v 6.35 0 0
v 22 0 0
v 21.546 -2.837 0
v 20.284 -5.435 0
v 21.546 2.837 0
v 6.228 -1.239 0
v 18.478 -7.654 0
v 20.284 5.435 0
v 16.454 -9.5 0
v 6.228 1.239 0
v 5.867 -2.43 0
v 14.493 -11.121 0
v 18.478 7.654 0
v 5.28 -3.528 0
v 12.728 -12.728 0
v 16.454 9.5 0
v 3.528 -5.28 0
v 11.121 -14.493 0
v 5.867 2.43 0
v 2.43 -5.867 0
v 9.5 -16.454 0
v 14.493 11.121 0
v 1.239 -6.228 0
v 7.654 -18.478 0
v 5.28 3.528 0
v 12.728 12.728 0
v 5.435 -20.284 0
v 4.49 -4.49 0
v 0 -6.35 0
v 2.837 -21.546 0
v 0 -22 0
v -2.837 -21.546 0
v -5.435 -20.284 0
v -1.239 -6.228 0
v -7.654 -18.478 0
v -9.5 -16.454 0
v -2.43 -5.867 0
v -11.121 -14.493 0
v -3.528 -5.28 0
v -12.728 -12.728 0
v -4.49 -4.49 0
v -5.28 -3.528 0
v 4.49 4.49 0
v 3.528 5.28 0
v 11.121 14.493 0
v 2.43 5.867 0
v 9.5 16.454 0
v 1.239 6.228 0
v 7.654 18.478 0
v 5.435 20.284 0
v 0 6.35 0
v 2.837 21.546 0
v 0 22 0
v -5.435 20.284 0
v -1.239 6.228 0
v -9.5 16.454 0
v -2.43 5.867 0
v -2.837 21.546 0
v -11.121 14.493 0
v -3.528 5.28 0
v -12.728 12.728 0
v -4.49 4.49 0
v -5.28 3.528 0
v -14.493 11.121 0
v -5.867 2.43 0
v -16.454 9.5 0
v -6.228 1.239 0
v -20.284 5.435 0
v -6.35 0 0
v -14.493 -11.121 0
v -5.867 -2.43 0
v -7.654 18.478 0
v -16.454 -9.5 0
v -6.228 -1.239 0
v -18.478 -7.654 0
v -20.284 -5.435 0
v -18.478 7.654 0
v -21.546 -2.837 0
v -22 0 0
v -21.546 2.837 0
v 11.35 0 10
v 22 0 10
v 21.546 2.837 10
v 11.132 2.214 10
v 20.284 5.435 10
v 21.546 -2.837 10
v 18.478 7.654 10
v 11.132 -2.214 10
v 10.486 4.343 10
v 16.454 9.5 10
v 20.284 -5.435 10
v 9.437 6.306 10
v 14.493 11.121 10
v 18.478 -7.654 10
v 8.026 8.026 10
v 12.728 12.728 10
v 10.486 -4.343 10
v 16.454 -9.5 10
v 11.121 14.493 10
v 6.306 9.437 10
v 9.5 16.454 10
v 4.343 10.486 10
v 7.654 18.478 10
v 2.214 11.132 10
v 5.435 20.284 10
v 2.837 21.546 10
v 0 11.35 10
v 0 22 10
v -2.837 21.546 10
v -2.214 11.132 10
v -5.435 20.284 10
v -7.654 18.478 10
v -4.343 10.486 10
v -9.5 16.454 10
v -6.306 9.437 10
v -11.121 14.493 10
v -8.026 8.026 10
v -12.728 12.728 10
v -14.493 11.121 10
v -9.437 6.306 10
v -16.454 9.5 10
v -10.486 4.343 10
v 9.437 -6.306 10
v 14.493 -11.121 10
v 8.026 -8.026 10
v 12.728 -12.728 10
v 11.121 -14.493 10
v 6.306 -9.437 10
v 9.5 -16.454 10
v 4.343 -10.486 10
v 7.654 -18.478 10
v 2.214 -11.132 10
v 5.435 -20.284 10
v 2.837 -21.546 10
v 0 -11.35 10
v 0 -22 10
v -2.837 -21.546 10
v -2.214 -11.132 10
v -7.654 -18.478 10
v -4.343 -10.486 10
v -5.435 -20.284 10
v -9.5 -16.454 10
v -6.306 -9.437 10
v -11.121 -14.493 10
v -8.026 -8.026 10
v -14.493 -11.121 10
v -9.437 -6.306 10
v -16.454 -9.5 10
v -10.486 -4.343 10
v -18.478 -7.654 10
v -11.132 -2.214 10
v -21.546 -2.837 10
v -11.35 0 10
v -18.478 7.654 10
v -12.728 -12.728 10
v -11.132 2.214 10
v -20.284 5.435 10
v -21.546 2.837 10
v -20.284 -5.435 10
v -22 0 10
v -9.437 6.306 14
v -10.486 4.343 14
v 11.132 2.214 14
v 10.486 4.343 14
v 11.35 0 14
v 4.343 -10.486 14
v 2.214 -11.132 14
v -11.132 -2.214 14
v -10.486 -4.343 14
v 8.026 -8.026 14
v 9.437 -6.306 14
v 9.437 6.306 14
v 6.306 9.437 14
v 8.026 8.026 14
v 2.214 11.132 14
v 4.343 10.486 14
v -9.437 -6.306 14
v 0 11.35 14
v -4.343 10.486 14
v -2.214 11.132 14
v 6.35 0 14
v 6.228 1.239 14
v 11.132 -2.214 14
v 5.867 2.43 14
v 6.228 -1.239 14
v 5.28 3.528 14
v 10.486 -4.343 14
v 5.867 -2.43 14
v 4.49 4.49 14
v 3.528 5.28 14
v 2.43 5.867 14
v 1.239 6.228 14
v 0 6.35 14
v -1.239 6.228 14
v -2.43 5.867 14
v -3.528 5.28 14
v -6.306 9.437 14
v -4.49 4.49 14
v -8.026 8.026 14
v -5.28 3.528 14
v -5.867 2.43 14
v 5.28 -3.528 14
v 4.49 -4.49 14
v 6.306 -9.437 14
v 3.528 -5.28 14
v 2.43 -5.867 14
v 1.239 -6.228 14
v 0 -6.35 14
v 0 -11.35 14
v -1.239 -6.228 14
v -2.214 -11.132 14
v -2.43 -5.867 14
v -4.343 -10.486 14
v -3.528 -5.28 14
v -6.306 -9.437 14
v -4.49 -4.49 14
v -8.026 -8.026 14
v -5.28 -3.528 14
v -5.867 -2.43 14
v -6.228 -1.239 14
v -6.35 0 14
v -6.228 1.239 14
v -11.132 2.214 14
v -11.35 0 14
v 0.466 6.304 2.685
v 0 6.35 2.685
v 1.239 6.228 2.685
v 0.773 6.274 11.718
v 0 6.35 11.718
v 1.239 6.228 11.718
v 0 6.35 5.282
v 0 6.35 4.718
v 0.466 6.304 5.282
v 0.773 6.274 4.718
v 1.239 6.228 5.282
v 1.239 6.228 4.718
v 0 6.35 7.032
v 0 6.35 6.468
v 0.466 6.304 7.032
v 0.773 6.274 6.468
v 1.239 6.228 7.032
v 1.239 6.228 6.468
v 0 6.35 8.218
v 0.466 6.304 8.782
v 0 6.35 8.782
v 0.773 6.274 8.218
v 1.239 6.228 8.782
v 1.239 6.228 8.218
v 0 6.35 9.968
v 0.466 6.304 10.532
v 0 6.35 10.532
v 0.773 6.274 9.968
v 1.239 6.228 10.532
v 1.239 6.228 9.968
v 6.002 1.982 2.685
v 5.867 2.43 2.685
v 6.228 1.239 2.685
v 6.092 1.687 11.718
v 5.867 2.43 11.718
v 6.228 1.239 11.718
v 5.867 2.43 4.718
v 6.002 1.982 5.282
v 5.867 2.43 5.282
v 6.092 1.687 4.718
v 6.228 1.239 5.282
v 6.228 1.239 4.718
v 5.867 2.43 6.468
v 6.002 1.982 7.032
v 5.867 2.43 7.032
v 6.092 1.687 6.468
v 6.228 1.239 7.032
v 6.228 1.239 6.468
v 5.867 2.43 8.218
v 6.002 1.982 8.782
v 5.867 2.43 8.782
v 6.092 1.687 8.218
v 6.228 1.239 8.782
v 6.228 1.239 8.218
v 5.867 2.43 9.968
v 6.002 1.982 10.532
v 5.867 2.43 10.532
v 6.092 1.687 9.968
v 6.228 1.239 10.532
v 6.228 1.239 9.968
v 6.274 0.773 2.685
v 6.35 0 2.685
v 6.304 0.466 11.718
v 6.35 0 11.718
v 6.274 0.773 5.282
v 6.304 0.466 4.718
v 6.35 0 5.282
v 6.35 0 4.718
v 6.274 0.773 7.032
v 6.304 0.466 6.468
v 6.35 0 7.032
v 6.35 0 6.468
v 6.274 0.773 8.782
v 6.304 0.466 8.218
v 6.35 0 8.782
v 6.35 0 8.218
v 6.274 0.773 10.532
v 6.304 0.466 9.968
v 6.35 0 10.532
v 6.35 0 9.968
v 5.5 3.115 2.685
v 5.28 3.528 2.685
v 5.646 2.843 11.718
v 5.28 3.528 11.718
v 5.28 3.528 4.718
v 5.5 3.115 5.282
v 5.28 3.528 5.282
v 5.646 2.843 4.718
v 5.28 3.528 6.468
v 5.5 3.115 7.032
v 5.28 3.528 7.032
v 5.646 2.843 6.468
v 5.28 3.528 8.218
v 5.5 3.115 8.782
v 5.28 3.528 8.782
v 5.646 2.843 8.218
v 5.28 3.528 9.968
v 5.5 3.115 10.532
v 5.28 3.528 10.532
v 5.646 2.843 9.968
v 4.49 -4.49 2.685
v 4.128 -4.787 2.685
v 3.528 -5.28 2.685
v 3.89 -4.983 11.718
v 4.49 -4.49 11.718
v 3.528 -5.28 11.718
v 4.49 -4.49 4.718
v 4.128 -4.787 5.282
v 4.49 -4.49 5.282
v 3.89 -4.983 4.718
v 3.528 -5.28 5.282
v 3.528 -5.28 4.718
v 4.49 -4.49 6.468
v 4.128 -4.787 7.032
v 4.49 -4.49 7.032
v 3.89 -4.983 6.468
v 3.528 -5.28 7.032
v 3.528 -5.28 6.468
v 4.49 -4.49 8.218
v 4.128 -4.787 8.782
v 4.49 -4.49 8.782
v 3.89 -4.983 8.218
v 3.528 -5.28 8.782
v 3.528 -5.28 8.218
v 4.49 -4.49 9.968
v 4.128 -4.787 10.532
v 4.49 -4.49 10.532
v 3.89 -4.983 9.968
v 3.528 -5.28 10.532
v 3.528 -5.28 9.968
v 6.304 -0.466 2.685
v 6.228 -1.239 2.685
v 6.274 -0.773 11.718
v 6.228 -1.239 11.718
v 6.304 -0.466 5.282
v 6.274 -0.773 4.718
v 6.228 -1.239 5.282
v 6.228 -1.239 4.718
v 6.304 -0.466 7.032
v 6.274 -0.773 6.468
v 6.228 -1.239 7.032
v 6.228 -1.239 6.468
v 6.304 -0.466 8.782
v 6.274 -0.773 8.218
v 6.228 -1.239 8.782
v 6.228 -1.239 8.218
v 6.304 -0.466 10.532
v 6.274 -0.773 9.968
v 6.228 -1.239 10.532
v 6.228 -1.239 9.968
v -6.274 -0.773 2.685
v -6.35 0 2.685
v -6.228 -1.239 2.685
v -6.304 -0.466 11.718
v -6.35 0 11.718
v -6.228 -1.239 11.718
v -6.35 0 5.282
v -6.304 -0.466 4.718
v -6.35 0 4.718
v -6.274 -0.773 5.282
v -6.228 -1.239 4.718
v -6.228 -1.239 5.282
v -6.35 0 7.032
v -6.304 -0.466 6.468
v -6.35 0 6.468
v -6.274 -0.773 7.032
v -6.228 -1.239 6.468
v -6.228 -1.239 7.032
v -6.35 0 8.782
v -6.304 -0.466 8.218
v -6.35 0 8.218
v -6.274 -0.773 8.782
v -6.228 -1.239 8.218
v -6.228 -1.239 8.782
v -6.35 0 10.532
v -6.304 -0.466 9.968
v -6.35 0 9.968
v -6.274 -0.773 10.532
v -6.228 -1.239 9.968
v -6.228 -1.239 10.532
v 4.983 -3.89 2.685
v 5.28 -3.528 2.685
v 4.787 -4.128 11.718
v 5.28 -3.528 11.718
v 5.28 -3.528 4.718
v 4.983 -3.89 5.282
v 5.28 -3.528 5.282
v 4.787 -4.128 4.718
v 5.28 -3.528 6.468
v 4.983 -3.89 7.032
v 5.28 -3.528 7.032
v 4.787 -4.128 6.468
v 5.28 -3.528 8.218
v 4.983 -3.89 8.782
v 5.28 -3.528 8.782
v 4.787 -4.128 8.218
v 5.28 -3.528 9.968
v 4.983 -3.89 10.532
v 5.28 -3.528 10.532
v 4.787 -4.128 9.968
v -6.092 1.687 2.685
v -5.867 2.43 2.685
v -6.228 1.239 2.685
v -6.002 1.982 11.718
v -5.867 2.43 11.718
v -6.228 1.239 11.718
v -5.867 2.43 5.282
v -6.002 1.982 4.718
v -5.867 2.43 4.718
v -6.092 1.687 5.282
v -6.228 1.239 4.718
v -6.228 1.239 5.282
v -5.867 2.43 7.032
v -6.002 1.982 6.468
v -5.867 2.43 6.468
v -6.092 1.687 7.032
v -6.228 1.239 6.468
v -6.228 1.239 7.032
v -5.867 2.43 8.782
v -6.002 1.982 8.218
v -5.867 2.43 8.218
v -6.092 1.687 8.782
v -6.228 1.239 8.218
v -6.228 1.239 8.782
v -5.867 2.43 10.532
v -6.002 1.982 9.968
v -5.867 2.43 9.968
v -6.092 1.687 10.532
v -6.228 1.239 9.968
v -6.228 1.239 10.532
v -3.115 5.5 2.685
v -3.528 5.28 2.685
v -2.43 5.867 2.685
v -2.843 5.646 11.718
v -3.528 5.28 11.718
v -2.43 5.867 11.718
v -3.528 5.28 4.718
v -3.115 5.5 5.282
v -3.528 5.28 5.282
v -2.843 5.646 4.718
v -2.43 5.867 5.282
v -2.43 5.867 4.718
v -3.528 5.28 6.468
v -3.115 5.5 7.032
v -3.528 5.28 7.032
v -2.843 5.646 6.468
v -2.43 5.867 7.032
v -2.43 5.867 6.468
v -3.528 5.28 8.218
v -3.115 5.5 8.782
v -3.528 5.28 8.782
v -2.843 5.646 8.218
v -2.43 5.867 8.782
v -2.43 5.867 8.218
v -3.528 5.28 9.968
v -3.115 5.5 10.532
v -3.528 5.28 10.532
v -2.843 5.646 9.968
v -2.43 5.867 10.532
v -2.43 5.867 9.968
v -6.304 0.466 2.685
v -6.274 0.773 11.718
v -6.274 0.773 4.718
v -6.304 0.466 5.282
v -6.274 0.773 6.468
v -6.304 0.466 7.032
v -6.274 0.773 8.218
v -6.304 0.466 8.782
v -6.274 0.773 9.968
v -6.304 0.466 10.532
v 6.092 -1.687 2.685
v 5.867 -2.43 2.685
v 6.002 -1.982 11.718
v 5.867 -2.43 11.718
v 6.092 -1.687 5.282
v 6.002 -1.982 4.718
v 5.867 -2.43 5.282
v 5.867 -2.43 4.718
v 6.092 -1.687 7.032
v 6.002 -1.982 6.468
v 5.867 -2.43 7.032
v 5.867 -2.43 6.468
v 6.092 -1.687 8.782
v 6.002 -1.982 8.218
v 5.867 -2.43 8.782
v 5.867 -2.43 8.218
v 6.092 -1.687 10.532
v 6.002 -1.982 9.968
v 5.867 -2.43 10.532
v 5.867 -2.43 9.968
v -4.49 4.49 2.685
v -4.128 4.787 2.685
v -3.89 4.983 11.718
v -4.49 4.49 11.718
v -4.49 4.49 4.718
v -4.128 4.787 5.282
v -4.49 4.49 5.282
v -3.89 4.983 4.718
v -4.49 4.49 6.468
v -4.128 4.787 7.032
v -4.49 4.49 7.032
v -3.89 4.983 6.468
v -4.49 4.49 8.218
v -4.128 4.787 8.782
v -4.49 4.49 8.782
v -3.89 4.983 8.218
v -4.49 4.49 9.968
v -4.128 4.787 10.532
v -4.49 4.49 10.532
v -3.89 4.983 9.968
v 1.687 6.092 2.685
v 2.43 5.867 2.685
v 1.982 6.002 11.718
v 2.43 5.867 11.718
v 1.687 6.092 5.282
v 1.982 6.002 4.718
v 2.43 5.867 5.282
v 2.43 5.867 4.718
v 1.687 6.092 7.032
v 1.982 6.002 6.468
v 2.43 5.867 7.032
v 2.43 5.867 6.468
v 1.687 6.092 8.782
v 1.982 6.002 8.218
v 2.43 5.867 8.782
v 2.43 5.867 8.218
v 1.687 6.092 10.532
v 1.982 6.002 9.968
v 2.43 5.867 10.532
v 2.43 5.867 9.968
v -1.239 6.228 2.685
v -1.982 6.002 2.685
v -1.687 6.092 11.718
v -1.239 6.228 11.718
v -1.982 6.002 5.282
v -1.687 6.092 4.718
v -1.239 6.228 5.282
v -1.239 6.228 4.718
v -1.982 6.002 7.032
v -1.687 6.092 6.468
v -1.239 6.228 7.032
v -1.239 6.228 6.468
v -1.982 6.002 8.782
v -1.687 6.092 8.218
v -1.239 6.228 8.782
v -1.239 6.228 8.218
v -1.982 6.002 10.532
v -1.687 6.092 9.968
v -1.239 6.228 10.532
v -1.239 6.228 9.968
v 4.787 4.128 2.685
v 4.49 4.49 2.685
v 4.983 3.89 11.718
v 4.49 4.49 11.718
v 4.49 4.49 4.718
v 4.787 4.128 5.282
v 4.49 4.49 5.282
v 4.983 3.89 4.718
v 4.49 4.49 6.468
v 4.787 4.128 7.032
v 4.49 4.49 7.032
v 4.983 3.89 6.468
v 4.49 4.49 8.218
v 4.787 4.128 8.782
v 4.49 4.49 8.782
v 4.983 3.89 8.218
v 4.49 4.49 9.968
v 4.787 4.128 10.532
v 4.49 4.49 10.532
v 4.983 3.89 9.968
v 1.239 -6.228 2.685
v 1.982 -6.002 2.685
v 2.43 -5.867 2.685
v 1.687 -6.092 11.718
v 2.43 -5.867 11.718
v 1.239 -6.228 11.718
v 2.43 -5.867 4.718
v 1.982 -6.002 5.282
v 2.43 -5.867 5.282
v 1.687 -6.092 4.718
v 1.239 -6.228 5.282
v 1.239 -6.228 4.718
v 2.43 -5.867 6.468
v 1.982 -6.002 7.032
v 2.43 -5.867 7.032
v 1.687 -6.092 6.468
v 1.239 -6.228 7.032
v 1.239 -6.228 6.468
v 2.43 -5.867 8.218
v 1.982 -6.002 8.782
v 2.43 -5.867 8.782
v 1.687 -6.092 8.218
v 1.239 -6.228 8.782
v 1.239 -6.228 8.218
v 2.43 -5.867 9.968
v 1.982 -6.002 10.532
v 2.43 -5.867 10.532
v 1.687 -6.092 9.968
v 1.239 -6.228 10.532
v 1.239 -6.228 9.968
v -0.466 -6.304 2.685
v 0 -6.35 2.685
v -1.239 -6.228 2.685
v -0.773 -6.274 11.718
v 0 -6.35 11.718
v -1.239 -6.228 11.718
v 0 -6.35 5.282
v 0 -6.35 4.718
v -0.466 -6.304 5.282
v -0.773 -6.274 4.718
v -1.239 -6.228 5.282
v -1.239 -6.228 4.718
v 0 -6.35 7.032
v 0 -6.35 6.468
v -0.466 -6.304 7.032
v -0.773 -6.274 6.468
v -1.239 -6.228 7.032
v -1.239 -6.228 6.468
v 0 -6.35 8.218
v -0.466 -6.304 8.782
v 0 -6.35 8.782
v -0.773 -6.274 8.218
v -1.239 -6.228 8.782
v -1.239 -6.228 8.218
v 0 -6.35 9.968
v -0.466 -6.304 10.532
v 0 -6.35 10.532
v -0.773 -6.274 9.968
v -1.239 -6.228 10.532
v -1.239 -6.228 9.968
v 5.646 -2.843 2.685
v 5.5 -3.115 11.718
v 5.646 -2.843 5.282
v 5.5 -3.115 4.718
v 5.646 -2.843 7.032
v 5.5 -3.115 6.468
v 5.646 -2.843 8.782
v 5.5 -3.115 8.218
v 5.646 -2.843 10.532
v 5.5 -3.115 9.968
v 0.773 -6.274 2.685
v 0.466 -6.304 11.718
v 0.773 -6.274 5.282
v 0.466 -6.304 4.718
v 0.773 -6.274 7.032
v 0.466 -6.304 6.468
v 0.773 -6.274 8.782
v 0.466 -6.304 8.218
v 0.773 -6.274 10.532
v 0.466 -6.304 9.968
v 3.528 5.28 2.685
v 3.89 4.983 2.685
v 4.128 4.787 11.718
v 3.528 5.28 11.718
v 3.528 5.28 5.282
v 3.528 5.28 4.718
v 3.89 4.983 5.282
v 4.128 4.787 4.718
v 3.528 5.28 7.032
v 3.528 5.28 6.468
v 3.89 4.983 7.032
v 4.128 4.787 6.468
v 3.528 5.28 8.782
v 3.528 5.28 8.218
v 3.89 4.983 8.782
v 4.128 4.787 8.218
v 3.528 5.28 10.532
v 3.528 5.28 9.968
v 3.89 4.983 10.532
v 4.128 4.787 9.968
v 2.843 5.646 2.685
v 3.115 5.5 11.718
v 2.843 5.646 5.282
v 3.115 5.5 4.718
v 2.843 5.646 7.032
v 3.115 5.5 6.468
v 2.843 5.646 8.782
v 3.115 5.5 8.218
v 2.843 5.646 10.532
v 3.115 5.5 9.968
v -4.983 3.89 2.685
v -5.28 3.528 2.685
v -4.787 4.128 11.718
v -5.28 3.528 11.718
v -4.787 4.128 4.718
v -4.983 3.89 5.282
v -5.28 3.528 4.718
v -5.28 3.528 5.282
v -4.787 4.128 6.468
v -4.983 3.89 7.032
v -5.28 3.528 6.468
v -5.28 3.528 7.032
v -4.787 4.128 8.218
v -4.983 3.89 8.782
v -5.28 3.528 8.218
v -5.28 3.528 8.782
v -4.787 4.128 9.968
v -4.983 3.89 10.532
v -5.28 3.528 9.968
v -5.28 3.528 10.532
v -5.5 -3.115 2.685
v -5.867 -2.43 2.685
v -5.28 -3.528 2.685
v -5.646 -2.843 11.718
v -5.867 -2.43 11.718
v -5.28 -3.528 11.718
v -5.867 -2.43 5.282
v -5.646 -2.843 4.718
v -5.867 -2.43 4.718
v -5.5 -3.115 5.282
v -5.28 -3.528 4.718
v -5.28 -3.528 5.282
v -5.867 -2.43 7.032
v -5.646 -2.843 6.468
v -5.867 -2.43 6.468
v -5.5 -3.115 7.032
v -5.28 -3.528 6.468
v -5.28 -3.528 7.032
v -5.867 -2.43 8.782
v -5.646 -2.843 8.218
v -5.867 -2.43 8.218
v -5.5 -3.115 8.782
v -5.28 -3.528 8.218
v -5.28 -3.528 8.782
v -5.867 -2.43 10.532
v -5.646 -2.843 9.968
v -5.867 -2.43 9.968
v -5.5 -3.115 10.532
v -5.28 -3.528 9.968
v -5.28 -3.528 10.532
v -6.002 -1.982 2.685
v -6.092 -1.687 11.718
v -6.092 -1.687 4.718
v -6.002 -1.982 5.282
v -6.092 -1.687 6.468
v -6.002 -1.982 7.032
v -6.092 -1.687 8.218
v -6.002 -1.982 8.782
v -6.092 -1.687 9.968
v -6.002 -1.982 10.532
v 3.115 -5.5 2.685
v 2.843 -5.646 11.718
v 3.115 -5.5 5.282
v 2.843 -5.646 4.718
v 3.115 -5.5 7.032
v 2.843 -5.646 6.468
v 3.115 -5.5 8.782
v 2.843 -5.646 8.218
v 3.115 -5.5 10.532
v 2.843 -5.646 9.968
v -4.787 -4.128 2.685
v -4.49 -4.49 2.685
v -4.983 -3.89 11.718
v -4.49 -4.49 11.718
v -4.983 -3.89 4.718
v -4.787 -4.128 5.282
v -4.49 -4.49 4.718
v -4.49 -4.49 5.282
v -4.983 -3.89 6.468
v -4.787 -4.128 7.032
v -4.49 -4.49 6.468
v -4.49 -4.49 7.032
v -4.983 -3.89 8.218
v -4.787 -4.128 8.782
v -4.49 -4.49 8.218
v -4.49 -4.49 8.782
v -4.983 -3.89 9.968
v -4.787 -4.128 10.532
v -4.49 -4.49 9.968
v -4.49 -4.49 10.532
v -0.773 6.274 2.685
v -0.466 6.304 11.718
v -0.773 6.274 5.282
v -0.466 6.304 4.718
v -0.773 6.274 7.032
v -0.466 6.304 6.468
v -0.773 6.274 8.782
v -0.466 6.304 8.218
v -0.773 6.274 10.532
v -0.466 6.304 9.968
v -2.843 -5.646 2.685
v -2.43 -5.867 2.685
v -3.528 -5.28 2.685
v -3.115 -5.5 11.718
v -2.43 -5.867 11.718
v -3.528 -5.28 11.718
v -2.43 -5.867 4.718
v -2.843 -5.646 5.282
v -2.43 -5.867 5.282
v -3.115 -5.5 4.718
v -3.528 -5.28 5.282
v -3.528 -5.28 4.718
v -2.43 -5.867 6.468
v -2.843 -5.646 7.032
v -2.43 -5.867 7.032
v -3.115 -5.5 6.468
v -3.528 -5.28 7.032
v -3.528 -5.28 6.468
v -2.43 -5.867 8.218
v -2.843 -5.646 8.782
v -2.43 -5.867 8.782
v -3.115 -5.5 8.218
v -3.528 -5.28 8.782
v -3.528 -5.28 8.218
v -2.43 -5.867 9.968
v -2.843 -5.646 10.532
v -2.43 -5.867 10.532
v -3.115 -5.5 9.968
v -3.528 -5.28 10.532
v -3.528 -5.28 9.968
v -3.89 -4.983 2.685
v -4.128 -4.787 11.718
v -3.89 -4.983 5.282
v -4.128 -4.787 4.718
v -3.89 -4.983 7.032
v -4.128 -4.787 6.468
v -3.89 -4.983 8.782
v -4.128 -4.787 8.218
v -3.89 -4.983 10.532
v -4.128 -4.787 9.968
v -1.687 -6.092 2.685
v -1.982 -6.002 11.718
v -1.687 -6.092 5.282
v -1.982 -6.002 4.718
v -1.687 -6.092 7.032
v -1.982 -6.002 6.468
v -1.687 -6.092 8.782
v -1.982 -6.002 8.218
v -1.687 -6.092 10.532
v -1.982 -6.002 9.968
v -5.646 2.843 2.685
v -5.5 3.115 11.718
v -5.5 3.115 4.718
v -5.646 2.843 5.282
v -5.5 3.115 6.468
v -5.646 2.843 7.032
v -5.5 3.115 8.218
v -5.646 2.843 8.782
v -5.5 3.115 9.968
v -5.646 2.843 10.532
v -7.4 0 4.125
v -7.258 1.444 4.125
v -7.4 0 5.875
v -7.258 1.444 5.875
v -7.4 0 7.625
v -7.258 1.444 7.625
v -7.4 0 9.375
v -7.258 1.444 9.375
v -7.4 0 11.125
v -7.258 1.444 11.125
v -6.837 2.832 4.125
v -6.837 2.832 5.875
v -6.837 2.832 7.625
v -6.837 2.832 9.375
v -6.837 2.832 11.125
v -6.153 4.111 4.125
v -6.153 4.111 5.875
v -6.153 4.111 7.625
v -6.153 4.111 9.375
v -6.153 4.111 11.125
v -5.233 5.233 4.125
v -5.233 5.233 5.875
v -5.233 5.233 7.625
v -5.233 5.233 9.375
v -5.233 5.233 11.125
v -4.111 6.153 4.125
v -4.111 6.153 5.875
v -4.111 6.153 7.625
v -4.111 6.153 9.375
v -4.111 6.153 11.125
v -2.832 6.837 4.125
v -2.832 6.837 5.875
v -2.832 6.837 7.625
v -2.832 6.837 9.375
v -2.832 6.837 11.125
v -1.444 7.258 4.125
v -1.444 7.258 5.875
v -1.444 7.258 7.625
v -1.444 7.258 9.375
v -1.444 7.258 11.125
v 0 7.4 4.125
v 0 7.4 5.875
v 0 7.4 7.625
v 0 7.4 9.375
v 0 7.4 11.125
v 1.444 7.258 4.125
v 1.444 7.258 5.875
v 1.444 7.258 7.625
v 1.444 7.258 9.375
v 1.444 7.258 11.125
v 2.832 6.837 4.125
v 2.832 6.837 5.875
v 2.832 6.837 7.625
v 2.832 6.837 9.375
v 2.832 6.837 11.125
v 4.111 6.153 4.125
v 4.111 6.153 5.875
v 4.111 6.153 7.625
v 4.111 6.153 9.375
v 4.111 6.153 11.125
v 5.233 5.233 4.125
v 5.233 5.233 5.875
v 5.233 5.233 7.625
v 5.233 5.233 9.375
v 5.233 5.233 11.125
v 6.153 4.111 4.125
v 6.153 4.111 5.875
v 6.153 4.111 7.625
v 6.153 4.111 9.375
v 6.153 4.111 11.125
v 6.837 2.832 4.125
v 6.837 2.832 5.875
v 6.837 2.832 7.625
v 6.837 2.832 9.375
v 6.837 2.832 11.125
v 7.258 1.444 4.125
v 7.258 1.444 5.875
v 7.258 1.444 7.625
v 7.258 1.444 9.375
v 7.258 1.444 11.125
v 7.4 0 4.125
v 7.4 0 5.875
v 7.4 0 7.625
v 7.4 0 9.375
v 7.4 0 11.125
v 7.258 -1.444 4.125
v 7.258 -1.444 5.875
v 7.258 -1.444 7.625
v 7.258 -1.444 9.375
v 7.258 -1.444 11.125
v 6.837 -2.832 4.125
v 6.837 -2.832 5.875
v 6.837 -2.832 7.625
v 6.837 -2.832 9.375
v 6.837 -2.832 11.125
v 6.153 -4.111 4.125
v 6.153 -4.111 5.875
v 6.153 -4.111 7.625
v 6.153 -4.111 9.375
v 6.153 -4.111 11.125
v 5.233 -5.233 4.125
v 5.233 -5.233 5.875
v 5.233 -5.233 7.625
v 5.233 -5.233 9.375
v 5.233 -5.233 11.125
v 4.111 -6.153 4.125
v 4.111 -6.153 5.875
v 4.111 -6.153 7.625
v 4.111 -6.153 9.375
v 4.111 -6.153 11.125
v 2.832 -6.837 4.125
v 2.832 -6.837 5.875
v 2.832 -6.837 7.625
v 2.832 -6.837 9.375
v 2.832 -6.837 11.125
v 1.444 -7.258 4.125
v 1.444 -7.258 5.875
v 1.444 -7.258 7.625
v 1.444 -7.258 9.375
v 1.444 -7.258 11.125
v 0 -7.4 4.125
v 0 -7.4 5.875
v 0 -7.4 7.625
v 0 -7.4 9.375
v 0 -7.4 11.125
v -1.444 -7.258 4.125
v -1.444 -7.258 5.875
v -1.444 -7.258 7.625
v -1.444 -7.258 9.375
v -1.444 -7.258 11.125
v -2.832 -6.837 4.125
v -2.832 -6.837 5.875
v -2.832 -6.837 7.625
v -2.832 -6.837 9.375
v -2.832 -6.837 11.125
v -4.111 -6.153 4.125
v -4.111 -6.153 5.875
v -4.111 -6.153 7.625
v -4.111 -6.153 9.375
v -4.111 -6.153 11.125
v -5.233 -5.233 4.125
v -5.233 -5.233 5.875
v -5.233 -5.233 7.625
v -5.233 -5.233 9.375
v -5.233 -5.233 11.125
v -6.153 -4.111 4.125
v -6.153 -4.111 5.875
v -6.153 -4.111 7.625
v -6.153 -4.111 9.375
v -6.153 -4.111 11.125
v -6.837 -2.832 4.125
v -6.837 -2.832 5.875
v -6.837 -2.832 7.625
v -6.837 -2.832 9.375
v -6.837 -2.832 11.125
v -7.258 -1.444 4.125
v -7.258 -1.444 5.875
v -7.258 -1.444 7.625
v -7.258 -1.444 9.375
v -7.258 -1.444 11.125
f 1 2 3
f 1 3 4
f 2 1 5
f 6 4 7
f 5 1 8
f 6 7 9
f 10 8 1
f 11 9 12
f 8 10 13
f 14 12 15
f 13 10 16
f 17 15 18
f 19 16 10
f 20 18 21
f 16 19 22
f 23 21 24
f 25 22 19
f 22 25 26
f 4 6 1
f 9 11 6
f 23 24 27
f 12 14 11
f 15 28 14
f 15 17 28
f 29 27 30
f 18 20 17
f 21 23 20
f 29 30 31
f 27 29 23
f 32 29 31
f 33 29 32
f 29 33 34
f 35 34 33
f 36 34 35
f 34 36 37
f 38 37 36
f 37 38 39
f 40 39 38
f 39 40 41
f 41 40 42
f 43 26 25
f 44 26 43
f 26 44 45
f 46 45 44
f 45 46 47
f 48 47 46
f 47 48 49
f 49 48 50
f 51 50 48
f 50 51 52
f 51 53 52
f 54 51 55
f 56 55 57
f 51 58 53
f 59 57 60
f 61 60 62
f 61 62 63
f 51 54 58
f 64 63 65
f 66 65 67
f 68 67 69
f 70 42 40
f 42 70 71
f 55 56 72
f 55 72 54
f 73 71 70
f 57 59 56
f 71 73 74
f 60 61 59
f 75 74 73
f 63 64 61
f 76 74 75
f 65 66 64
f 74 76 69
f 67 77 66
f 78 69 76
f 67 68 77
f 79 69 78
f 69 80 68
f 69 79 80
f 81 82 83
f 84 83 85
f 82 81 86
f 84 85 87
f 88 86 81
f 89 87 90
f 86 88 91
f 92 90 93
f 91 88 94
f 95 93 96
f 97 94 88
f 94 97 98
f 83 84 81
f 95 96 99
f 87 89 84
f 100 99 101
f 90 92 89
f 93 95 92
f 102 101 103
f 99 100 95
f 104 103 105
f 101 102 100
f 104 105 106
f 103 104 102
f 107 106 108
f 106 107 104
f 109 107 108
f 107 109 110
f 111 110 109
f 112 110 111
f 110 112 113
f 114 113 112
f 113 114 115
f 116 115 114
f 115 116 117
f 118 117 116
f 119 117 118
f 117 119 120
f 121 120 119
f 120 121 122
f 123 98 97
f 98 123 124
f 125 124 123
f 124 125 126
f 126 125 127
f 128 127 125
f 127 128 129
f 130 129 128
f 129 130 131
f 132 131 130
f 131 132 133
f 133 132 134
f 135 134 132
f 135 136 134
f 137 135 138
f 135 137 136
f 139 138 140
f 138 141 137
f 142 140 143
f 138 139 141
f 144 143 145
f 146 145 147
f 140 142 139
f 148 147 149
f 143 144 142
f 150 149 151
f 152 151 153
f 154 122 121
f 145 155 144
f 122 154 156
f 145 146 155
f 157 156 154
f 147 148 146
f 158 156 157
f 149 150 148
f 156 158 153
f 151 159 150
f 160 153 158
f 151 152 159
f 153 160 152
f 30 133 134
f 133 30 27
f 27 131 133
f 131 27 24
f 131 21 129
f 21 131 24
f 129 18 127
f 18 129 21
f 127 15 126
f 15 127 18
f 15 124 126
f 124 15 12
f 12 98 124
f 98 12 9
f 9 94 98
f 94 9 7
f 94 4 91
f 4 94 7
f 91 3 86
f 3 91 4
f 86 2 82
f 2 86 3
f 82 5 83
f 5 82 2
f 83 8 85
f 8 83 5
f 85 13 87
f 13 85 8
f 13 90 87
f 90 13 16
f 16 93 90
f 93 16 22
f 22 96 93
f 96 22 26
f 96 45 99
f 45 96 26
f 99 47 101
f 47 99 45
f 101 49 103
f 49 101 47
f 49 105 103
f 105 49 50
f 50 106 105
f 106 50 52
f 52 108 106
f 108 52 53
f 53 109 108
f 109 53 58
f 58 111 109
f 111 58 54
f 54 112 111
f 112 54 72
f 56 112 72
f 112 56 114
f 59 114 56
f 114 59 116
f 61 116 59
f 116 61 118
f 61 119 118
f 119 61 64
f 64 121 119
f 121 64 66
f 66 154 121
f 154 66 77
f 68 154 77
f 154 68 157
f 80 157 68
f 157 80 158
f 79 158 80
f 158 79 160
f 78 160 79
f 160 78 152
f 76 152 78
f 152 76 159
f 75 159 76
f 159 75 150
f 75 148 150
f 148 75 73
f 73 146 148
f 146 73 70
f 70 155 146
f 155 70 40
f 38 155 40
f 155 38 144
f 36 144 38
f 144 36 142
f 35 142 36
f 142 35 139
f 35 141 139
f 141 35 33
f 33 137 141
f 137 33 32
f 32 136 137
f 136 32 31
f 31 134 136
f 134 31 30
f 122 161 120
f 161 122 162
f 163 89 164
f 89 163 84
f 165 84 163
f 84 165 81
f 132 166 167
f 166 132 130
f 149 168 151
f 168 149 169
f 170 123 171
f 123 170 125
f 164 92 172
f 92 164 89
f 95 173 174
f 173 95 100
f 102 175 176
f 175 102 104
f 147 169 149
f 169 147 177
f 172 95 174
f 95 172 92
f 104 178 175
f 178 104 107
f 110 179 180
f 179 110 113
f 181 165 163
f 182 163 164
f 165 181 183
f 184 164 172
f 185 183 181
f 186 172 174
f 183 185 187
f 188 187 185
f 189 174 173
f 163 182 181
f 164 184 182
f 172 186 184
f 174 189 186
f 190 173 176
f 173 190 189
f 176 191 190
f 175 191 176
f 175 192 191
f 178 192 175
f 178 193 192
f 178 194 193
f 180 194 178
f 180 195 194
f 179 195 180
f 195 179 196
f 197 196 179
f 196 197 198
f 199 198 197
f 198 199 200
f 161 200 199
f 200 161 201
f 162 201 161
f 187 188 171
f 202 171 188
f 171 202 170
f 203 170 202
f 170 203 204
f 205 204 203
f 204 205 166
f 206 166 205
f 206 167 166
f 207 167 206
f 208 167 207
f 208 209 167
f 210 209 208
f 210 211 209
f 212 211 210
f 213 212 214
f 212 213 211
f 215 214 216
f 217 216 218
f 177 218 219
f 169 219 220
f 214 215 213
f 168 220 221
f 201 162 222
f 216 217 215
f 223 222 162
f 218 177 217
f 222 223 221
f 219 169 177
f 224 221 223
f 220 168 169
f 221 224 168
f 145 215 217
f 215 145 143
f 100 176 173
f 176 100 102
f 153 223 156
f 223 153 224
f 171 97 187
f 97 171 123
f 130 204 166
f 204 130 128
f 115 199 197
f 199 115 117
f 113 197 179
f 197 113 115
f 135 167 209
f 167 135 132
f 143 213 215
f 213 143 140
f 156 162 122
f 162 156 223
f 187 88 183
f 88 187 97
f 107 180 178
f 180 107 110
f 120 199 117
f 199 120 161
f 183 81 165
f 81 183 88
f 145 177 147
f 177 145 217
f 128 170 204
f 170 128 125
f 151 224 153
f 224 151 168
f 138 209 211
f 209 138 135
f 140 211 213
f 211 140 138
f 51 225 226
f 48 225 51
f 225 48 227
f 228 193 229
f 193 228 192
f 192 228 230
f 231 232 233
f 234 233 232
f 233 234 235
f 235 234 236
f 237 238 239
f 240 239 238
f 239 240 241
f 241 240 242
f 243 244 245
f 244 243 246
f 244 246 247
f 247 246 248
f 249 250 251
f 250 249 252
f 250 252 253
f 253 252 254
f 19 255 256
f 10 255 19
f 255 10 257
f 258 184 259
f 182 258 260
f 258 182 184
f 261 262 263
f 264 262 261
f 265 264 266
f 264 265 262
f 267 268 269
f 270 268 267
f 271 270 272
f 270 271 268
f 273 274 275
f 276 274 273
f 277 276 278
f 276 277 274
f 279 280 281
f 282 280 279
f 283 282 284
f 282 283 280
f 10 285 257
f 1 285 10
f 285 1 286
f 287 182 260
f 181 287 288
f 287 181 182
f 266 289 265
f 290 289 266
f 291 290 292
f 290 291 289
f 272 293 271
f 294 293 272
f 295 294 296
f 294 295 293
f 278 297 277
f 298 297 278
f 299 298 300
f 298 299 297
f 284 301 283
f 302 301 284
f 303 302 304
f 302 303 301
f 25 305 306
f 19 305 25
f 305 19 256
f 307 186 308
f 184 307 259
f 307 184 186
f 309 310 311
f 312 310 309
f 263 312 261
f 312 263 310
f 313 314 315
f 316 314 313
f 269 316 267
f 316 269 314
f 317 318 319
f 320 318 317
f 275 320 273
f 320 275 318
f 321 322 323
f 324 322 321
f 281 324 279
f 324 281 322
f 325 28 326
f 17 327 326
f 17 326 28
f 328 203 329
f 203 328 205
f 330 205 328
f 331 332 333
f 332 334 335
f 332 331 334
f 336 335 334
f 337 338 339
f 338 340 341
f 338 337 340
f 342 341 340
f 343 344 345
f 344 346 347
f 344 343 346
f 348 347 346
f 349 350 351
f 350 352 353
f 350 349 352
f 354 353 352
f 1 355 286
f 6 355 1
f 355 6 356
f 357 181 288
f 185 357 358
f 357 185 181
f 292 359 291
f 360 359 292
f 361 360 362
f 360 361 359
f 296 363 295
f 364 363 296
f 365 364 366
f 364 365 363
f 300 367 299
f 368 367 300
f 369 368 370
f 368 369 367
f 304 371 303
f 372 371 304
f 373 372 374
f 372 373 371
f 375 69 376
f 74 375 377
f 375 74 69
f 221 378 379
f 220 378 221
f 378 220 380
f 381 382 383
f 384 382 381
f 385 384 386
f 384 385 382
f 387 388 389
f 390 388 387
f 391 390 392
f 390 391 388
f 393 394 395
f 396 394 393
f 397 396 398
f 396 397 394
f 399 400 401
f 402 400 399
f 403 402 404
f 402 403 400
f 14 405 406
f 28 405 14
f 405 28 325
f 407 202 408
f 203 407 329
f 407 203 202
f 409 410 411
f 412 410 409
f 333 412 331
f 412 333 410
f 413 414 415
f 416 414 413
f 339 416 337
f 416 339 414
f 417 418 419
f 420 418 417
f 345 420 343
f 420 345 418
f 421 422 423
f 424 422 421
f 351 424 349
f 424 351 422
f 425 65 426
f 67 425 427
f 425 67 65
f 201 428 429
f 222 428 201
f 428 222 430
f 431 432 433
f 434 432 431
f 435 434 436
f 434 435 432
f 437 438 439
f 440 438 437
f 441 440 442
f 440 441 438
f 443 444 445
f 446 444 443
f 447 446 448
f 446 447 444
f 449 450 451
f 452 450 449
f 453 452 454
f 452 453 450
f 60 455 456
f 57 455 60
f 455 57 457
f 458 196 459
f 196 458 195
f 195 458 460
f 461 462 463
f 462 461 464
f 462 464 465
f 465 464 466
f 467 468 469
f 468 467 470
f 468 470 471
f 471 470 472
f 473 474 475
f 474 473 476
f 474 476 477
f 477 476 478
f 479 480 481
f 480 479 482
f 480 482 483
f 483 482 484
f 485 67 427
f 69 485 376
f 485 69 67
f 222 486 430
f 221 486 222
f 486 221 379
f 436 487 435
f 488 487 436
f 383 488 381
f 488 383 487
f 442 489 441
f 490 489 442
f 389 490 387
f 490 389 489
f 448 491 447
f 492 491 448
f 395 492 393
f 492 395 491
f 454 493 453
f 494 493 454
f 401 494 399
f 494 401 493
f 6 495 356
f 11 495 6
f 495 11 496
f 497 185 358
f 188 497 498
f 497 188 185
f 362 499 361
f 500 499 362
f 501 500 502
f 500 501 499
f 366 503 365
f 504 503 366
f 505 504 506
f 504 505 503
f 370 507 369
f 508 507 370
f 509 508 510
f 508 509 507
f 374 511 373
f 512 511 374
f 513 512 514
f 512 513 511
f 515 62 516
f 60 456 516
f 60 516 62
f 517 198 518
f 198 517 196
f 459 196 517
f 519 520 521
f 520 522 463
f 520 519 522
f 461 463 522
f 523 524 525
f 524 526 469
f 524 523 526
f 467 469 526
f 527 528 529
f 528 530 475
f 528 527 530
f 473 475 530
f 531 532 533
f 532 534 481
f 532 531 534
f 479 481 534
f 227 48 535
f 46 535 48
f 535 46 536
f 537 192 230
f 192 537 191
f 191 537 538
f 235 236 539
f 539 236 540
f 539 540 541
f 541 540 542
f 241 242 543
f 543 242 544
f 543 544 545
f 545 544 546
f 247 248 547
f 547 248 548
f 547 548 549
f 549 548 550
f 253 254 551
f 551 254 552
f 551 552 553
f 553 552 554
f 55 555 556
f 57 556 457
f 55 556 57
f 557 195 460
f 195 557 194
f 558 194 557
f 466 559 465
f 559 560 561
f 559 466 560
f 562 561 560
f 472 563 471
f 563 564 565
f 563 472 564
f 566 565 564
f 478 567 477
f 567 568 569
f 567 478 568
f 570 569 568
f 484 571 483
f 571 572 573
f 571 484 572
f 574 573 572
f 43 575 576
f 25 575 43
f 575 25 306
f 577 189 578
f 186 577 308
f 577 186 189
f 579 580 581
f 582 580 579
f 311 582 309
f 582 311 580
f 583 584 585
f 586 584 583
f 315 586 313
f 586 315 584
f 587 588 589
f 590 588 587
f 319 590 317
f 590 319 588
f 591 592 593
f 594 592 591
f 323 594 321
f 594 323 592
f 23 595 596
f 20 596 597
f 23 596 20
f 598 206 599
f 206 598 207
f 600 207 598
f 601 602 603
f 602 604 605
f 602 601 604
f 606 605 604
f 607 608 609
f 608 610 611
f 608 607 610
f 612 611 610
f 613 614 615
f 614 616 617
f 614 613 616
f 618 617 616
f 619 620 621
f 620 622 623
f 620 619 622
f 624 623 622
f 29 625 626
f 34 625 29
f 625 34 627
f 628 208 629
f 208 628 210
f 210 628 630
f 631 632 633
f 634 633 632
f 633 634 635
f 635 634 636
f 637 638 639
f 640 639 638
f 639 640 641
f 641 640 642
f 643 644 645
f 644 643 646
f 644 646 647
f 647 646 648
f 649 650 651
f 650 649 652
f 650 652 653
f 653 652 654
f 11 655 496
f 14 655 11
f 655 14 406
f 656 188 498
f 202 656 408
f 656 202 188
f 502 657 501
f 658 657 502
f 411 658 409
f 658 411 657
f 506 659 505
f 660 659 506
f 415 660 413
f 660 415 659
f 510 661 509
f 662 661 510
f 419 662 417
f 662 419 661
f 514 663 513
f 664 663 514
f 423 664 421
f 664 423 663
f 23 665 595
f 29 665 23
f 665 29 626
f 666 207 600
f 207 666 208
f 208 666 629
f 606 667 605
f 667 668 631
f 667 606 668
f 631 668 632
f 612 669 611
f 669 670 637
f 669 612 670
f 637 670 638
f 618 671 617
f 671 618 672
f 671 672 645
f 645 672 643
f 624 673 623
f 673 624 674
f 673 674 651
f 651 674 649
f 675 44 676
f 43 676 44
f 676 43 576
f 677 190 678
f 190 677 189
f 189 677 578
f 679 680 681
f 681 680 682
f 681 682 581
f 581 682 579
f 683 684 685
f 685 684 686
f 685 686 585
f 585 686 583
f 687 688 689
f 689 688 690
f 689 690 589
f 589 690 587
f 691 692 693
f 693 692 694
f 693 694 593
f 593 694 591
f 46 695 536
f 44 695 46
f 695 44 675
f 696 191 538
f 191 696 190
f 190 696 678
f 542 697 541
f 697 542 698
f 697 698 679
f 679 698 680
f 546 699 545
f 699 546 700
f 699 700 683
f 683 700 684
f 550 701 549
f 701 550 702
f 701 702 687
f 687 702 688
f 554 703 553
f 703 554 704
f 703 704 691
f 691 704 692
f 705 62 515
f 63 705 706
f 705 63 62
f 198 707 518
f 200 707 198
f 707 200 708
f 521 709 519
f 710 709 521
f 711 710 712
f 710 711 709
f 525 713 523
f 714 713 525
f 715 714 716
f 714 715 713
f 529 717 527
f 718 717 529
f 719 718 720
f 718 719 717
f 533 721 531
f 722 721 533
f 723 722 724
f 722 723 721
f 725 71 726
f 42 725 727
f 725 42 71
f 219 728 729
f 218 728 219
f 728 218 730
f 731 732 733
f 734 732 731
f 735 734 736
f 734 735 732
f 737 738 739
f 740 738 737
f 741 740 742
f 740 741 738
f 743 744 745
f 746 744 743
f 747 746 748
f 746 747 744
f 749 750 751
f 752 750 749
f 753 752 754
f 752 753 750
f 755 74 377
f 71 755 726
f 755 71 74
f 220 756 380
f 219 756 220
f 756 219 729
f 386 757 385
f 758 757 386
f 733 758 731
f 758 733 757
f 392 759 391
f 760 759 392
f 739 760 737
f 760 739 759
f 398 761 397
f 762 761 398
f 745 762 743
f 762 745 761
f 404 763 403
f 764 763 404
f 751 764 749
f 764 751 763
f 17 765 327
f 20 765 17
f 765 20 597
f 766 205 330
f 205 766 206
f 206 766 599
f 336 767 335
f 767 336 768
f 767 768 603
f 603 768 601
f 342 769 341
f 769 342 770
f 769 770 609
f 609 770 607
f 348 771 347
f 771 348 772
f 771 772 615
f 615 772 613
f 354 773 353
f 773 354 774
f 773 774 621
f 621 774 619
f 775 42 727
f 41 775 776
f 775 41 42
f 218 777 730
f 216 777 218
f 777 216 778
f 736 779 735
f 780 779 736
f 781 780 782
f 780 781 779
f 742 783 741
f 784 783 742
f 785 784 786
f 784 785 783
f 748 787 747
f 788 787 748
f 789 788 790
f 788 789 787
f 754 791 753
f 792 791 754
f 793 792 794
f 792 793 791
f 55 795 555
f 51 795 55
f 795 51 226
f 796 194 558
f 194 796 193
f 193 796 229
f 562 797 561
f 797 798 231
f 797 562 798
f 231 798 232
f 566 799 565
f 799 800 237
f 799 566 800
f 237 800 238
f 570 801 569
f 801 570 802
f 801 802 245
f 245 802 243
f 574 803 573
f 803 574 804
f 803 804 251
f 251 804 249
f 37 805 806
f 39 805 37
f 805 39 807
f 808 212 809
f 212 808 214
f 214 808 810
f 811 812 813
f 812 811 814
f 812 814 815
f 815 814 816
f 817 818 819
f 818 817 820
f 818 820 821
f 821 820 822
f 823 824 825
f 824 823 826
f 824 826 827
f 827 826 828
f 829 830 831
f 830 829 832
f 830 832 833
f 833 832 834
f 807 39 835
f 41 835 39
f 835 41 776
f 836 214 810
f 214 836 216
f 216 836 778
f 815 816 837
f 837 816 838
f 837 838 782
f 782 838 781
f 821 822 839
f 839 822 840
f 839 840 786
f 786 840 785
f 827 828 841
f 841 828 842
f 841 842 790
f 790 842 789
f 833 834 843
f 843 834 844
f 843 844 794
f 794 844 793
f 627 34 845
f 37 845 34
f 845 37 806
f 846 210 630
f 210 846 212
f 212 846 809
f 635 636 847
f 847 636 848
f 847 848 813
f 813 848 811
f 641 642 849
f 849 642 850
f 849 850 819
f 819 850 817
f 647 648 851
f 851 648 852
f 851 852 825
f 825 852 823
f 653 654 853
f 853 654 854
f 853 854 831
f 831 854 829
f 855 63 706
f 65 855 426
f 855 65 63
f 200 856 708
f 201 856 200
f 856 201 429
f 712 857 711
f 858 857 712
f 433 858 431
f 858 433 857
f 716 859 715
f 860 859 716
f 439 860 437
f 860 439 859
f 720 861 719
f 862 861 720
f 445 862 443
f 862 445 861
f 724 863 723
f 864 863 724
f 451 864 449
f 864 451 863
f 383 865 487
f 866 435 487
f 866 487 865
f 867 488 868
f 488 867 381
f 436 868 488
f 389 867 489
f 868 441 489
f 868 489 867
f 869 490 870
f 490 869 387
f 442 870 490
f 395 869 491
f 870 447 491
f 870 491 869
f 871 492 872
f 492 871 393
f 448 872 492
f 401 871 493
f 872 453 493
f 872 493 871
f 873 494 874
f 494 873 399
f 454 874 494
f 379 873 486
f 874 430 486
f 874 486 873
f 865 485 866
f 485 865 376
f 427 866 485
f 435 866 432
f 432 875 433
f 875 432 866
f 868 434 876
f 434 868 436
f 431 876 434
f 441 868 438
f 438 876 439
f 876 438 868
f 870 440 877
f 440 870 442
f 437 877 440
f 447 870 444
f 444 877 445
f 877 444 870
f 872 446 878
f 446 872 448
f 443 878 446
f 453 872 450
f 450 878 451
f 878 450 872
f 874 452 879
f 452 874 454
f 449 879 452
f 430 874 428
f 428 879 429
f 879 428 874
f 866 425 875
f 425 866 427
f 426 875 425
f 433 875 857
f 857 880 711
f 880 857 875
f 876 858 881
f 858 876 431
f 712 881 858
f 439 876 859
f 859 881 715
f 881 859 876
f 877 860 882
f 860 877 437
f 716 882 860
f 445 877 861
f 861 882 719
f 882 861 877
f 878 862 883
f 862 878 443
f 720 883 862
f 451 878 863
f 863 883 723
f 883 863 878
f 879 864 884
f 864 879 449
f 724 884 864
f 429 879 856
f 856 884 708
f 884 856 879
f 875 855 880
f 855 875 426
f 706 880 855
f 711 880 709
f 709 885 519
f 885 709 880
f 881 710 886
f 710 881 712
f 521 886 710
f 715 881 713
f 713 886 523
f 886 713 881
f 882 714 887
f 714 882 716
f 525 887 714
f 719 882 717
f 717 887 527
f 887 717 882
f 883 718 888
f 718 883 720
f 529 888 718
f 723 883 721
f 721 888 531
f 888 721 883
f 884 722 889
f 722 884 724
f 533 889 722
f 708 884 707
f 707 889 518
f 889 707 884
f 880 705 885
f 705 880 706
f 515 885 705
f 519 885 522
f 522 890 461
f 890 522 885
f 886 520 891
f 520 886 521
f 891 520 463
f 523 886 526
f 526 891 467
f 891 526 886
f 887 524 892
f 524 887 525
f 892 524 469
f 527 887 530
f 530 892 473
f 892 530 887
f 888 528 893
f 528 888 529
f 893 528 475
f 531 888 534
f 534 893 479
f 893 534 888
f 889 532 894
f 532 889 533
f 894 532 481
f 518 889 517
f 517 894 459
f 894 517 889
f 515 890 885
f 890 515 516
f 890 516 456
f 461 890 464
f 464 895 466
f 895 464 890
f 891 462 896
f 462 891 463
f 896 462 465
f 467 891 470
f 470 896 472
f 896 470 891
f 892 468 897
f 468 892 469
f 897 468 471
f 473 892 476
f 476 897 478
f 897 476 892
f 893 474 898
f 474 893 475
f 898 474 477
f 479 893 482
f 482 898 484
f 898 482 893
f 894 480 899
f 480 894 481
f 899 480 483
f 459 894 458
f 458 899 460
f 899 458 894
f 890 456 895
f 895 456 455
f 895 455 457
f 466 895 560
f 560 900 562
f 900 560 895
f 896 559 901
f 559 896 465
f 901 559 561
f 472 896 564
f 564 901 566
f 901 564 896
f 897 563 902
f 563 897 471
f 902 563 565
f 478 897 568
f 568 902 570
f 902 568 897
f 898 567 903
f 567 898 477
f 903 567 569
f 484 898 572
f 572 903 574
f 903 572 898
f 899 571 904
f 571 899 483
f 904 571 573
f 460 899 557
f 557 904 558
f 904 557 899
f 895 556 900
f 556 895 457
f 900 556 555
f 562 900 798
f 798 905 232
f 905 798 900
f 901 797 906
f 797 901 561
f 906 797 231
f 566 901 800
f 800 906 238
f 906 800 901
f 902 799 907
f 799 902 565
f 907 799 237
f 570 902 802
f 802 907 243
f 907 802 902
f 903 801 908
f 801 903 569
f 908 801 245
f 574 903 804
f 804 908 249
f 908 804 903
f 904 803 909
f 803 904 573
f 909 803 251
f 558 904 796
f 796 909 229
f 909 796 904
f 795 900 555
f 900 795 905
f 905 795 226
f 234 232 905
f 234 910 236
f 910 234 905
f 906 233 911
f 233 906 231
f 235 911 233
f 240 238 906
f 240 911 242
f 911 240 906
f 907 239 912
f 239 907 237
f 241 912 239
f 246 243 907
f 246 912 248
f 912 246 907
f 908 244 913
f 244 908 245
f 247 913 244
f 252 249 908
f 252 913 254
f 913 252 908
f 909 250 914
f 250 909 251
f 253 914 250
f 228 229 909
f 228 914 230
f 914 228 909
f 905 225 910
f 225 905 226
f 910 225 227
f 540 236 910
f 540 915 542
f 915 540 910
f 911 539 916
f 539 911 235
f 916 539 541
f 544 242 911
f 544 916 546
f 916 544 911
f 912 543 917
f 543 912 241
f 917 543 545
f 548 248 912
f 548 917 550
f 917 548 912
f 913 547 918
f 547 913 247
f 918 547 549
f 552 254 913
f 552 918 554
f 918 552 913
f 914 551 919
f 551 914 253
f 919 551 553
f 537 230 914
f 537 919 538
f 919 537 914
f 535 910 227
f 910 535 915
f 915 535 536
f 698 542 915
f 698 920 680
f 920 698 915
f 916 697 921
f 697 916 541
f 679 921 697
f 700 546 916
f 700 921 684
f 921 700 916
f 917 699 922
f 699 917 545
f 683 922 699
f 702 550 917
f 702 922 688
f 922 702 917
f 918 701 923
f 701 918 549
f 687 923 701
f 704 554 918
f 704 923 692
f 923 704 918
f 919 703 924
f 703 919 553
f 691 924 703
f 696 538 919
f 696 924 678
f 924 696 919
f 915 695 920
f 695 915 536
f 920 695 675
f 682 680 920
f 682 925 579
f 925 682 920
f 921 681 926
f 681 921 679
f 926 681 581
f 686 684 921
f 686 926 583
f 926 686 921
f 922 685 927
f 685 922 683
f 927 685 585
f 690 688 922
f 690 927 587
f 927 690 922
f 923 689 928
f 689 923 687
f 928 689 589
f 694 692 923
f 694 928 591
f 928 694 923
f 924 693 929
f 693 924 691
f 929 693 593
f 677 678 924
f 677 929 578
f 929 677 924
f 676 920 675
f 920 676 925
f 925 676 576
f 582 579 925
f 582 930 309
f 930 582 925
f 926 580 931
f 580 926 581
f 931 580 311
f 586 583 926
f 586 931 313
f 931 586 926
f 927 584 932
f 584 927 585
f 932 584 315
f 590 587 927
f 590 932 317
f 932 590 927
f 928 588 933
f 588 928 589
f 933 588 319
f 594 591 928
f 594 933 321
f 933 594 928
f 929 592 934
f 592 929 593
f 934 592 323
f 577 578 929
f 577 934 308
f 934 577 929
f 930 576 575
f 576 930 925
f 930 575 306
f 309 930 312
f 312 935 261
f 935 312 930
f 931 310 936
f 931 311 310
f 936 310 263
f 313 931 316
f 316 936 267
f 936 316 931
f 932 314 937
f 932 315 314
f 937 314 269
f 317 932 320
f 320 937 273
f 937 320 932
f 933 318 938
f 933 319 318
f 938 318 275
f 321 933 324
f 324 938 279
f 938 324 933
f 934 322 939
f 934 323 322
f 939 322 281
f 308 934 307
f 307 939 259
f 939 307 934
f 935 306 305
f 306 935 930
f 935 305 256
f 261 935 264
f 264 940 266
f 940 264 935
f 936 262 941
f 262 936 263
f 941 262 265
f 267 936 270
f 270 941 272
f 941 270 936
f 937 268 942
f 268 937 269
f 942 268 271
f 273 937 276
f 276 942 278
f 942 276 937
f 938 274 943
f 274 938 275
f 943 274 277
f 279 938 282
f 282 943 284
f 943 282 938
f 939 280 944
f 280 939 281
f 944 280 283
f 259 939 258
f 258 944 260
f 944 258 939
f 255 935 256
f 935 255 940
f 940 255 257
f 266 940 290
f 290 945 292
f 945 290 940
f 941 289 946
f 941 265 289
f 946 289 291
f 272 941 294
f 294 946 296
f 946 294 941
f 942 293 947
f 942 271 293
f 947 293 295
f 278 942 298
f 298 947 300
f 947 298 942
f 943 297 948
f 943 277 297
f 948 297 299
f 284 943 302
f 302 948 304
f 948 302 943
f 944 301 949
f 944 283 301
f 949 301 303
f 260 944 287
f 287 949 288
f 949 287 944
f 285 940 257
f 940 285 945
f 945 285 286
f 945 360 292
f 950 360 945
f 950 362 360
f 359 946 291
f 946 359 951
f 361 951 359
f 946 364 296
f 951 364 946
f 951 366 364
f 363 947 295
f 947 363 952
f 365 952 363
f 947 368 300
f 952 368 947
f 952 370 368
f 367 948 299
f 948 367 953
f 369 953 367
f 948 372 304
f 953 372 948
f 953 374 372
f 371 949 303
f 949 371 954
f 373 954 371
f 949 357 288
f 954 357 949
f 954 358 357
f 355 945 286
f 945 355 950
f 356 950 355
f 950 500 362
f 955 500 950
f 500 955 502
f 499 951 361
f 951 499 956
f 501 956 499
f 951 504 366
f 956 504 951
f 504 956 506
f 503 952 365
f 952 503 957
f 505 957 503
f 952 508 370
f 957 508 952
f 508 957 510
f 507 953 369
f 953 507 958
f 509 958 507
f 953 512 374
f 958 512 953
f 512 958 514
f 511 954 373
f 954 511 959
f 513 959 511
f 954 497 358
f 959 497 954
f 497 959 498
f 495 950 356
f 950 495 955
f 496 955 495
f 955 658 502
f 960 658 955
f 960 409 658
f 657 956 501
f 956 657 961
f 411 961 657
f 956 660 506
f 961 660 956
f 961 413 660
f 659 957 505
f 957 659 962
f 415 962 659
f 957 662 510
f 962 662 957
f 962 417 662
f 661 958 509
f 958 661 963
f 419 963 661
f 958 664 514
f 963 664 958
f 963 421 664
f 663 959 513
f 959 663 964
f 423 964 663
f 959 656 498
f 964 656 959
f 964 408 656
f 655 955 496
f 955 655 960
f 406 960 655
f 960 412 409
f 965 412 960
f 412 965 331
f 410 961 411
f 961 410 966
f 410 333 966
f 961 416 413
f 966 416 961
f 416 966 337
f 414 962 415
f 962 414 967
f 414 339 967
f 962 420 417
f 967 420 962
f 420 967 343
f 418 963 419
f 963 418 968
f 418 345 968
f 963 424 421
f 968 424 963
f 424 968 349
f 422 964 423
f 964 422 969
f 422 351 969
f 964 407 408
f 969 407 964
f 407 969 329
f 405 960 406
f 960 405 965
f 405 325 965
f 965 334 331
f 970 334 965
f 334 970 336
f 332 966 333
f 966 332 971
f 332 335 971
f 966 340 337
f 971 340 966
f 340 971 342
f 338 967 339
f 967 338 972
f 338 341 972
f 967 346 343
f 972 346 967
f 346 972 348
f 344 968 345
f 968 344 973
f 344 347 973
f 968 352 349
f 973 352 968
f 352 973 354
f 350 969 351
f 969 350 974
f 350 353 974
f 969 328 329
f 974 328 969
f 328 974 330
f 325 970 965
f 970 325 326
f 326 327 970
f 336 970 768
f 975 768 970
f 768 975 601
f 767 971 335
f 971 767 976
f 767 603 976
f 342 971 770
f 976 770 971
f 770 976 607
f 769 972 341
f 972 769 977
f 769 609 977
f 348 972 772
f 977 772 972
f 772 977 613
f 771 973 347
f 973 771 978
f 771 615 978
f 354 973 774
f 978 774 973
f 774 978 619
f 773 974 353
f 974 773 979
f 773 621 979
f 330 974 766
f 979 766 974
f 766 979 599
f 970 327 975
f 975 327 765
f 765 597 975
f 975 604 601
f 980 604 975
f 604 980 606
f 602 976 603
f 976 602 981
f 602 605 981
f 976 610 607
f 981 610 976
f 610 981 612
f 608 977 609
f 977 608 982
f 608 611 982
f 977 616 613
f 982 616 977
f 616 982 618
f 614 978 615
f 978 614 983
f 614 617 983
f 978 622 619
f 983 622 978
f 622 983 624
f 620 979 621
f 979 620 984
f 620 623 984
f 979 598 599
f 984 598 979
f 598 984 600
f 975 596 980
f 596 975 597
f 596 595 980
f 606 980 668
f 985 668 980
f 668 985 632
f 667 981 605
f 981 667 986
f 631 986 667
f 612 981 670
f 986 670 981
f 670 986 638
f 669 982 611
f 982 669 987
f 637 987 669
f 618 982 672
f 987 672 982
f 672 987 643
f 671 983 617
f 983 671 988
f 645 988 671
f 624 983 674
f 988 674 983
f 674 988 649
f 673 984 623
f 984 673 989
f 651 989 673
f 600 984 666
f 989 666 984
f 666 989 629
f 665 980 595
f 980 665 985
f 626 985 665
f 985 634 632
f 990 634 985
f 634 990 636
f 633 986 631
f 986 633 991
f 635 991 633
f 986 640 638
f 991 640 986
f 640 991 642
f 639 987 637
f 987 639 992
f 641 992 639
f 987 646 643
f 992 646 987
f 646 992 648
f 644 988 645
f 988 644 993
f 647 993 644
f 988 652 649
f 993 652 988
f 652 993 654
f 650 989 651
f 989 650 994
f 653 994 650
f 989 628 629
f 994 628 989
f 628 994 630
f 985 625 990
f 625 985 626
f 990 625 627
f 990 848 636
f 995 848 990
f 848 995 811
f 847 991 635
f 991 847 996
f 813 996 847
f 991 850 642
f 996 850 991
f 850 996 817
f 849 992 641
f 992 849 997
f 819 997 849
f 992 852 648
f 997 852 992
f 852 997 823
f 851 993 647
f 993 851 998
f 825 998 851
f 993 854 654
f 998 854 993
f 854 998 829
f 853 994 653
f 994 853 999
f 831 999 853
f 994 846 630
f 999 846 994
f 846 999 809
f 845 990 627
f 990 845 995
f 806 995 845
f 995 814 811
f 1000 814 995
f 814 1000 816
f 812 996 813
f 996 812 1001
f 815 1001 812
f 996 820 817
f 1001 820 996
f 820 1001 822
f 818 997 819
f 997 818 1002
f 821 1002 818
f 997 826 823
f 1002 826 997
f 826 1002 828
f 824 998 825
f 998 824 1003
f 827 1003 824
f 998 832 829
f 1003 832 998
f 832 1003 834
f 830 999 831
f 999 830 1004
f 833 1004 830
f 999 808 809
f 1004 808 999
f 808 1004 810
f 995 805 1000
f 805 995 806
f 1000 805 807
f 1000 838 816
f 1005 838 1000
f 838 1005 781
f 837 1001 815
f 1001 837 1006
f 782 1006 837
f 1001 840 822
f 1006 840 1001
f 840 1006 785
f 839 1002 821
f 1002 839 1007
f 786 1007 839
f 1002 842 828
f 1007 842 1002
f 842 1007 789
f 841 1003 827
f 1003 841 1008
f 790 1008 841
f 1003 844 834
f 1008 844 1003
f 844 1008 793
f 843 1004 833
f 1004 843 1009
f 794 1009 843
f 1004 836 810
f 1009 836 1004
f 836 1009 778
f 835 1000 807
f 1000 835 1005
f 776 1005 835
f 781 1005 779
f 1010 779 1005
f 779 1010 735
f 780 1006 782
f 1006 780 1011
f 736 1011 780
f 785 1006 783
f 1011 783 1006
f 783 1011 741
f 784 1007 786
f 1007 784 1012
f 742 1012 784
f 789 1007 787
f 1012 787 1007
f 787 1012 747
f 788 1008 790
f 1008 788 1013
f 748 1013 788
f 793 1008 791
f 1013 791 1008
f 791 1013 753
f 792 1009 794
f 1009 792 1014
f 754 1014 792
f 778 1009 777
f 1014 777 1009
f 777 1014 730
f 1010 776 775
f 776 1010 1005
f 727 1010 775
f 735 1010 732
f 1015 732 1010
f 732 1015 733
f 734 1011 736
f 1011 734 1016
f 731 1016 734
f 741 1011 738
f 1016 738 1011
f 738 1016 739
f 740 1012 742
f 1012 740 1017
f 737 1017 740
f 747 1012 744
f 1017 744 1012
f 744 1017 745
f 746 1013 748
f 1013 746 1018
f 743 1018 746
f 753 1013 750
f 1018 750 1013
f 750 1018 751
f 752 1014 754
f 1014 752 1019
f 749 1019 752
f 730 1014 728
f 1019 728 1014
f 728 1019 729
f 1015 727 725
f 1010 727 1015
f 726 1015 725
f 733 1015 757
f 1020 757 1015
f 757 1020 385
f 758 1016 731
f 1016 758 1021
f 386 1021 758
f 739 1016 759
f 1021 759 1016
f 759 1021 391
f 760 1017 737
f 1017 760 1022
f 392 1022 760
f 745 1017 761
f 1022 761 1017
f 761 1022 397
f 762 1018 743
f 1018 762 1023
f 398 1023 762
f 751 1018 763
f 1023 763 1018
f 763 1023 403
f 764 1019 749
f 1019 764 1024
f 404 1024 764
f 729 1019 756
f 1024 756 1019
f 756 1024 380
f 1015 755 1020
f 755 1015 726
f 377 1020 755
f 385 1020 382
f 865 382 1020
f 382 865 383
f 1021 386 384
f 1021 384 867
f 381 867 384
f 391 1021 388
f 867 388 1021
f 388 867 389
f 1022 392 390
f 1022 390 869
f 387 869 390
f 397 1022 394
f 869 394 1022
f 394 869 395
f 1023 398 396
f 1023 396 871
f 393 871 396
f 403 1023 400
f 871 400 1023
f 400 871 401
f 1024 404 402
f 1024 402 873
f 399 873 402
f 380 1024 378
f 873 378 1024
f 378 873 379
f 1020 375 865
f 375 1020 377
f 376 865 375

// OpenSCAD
$fn = 32;

// ----------------------------------------------------------------------
// Thumb nut: 4 lobe grip, 14 mm tall, M12.7 thread
// ----------------------------------------------------------------------

// --- parameters (mm) ---
base_r = 20;              // grip base radius
lobe_amp = 2;             // lobe height above the base radius
lobes = 4;                // number of grip lobes
grip_h = 10;              // grip height
boss_d = 22.7;            // threaded boss diameter
boss_h = 4;               // boss height
bore_d = 12.7;            // thread core diameter
pitch = 1.75;             // thread pitch
thread_d = 1.05;          // thread depth

grip = [[22, 0], [21.546, 2.837], [20.284, 5.435], [18.478, 7.654], [16.454, 9.5], [14.493, 11.121], [12.728, 12.728], [11.121, 14.493], [9.5, 16.454], [7.654, 18.478], [5.435, 20.284], [2.837, 21.546], [0, 22], [-2.837, 21.546], [-5.435, 20.284], [-7.654, 18.478], [-9.5, 16.454], [-11.121, 14.493], [-12.728, 12.728], [-14.493, 11.121], [-16.454, 9.5], [-18.478, 7.654], [-20.284, 5.435], [-21.546, 2.837], [-22, 0], [-21.546, -2.837], [-20.284, -5.435], [-18.478, -7.654], [-16.454, -9.5], [-14.493, -11.121], [-12.728, -12.728], [-11.121, -14.493], [-9.5, -16.454], [-7.654, -18.478], [-5.435, -20.284], [-2.837, -21.546], [0, -22], [2.837, -21.546], [5.435, -20.284], [7.654, -18.478], [9.5, -16.454], [11.121, -14.493], [12.728, -12.728], [14.493, -11.121], [16.454, -9.5], [18.478, -7.654], [20.284, -5.435], [21.546, -2.837]];

difference() {
  union() {
    /* grip outline extruded straight up */
    linear_extrude(height = grip_h) polygon(grip);
    /* boss sunk half a millimetre into the grip */
    translate([0, 0, grip_h - 0.5]) cylinder(h = boss_h + 0.5, d = boss_d);
  }
  /* threaded bore through grip and boss */
  translate([0, 0, -2.5]) cylinder(h = grip_h + boss_h + 5, d = bore_d);
  translate([0, 0, 2.0]) rotate_extrude() polygon([[5.35, 0], [5.35, 10], [5.85, 10], [7.4, 9.125], [5.85, 8.25], [7.4, 7.375], [5.85, 6.5], [7.4, 5.625], [5.85, 4.75], [7.4, 3.875], [5.85, 3], [7.4, 2.125], [5.85, 0], [5.35, 0]]);
}
